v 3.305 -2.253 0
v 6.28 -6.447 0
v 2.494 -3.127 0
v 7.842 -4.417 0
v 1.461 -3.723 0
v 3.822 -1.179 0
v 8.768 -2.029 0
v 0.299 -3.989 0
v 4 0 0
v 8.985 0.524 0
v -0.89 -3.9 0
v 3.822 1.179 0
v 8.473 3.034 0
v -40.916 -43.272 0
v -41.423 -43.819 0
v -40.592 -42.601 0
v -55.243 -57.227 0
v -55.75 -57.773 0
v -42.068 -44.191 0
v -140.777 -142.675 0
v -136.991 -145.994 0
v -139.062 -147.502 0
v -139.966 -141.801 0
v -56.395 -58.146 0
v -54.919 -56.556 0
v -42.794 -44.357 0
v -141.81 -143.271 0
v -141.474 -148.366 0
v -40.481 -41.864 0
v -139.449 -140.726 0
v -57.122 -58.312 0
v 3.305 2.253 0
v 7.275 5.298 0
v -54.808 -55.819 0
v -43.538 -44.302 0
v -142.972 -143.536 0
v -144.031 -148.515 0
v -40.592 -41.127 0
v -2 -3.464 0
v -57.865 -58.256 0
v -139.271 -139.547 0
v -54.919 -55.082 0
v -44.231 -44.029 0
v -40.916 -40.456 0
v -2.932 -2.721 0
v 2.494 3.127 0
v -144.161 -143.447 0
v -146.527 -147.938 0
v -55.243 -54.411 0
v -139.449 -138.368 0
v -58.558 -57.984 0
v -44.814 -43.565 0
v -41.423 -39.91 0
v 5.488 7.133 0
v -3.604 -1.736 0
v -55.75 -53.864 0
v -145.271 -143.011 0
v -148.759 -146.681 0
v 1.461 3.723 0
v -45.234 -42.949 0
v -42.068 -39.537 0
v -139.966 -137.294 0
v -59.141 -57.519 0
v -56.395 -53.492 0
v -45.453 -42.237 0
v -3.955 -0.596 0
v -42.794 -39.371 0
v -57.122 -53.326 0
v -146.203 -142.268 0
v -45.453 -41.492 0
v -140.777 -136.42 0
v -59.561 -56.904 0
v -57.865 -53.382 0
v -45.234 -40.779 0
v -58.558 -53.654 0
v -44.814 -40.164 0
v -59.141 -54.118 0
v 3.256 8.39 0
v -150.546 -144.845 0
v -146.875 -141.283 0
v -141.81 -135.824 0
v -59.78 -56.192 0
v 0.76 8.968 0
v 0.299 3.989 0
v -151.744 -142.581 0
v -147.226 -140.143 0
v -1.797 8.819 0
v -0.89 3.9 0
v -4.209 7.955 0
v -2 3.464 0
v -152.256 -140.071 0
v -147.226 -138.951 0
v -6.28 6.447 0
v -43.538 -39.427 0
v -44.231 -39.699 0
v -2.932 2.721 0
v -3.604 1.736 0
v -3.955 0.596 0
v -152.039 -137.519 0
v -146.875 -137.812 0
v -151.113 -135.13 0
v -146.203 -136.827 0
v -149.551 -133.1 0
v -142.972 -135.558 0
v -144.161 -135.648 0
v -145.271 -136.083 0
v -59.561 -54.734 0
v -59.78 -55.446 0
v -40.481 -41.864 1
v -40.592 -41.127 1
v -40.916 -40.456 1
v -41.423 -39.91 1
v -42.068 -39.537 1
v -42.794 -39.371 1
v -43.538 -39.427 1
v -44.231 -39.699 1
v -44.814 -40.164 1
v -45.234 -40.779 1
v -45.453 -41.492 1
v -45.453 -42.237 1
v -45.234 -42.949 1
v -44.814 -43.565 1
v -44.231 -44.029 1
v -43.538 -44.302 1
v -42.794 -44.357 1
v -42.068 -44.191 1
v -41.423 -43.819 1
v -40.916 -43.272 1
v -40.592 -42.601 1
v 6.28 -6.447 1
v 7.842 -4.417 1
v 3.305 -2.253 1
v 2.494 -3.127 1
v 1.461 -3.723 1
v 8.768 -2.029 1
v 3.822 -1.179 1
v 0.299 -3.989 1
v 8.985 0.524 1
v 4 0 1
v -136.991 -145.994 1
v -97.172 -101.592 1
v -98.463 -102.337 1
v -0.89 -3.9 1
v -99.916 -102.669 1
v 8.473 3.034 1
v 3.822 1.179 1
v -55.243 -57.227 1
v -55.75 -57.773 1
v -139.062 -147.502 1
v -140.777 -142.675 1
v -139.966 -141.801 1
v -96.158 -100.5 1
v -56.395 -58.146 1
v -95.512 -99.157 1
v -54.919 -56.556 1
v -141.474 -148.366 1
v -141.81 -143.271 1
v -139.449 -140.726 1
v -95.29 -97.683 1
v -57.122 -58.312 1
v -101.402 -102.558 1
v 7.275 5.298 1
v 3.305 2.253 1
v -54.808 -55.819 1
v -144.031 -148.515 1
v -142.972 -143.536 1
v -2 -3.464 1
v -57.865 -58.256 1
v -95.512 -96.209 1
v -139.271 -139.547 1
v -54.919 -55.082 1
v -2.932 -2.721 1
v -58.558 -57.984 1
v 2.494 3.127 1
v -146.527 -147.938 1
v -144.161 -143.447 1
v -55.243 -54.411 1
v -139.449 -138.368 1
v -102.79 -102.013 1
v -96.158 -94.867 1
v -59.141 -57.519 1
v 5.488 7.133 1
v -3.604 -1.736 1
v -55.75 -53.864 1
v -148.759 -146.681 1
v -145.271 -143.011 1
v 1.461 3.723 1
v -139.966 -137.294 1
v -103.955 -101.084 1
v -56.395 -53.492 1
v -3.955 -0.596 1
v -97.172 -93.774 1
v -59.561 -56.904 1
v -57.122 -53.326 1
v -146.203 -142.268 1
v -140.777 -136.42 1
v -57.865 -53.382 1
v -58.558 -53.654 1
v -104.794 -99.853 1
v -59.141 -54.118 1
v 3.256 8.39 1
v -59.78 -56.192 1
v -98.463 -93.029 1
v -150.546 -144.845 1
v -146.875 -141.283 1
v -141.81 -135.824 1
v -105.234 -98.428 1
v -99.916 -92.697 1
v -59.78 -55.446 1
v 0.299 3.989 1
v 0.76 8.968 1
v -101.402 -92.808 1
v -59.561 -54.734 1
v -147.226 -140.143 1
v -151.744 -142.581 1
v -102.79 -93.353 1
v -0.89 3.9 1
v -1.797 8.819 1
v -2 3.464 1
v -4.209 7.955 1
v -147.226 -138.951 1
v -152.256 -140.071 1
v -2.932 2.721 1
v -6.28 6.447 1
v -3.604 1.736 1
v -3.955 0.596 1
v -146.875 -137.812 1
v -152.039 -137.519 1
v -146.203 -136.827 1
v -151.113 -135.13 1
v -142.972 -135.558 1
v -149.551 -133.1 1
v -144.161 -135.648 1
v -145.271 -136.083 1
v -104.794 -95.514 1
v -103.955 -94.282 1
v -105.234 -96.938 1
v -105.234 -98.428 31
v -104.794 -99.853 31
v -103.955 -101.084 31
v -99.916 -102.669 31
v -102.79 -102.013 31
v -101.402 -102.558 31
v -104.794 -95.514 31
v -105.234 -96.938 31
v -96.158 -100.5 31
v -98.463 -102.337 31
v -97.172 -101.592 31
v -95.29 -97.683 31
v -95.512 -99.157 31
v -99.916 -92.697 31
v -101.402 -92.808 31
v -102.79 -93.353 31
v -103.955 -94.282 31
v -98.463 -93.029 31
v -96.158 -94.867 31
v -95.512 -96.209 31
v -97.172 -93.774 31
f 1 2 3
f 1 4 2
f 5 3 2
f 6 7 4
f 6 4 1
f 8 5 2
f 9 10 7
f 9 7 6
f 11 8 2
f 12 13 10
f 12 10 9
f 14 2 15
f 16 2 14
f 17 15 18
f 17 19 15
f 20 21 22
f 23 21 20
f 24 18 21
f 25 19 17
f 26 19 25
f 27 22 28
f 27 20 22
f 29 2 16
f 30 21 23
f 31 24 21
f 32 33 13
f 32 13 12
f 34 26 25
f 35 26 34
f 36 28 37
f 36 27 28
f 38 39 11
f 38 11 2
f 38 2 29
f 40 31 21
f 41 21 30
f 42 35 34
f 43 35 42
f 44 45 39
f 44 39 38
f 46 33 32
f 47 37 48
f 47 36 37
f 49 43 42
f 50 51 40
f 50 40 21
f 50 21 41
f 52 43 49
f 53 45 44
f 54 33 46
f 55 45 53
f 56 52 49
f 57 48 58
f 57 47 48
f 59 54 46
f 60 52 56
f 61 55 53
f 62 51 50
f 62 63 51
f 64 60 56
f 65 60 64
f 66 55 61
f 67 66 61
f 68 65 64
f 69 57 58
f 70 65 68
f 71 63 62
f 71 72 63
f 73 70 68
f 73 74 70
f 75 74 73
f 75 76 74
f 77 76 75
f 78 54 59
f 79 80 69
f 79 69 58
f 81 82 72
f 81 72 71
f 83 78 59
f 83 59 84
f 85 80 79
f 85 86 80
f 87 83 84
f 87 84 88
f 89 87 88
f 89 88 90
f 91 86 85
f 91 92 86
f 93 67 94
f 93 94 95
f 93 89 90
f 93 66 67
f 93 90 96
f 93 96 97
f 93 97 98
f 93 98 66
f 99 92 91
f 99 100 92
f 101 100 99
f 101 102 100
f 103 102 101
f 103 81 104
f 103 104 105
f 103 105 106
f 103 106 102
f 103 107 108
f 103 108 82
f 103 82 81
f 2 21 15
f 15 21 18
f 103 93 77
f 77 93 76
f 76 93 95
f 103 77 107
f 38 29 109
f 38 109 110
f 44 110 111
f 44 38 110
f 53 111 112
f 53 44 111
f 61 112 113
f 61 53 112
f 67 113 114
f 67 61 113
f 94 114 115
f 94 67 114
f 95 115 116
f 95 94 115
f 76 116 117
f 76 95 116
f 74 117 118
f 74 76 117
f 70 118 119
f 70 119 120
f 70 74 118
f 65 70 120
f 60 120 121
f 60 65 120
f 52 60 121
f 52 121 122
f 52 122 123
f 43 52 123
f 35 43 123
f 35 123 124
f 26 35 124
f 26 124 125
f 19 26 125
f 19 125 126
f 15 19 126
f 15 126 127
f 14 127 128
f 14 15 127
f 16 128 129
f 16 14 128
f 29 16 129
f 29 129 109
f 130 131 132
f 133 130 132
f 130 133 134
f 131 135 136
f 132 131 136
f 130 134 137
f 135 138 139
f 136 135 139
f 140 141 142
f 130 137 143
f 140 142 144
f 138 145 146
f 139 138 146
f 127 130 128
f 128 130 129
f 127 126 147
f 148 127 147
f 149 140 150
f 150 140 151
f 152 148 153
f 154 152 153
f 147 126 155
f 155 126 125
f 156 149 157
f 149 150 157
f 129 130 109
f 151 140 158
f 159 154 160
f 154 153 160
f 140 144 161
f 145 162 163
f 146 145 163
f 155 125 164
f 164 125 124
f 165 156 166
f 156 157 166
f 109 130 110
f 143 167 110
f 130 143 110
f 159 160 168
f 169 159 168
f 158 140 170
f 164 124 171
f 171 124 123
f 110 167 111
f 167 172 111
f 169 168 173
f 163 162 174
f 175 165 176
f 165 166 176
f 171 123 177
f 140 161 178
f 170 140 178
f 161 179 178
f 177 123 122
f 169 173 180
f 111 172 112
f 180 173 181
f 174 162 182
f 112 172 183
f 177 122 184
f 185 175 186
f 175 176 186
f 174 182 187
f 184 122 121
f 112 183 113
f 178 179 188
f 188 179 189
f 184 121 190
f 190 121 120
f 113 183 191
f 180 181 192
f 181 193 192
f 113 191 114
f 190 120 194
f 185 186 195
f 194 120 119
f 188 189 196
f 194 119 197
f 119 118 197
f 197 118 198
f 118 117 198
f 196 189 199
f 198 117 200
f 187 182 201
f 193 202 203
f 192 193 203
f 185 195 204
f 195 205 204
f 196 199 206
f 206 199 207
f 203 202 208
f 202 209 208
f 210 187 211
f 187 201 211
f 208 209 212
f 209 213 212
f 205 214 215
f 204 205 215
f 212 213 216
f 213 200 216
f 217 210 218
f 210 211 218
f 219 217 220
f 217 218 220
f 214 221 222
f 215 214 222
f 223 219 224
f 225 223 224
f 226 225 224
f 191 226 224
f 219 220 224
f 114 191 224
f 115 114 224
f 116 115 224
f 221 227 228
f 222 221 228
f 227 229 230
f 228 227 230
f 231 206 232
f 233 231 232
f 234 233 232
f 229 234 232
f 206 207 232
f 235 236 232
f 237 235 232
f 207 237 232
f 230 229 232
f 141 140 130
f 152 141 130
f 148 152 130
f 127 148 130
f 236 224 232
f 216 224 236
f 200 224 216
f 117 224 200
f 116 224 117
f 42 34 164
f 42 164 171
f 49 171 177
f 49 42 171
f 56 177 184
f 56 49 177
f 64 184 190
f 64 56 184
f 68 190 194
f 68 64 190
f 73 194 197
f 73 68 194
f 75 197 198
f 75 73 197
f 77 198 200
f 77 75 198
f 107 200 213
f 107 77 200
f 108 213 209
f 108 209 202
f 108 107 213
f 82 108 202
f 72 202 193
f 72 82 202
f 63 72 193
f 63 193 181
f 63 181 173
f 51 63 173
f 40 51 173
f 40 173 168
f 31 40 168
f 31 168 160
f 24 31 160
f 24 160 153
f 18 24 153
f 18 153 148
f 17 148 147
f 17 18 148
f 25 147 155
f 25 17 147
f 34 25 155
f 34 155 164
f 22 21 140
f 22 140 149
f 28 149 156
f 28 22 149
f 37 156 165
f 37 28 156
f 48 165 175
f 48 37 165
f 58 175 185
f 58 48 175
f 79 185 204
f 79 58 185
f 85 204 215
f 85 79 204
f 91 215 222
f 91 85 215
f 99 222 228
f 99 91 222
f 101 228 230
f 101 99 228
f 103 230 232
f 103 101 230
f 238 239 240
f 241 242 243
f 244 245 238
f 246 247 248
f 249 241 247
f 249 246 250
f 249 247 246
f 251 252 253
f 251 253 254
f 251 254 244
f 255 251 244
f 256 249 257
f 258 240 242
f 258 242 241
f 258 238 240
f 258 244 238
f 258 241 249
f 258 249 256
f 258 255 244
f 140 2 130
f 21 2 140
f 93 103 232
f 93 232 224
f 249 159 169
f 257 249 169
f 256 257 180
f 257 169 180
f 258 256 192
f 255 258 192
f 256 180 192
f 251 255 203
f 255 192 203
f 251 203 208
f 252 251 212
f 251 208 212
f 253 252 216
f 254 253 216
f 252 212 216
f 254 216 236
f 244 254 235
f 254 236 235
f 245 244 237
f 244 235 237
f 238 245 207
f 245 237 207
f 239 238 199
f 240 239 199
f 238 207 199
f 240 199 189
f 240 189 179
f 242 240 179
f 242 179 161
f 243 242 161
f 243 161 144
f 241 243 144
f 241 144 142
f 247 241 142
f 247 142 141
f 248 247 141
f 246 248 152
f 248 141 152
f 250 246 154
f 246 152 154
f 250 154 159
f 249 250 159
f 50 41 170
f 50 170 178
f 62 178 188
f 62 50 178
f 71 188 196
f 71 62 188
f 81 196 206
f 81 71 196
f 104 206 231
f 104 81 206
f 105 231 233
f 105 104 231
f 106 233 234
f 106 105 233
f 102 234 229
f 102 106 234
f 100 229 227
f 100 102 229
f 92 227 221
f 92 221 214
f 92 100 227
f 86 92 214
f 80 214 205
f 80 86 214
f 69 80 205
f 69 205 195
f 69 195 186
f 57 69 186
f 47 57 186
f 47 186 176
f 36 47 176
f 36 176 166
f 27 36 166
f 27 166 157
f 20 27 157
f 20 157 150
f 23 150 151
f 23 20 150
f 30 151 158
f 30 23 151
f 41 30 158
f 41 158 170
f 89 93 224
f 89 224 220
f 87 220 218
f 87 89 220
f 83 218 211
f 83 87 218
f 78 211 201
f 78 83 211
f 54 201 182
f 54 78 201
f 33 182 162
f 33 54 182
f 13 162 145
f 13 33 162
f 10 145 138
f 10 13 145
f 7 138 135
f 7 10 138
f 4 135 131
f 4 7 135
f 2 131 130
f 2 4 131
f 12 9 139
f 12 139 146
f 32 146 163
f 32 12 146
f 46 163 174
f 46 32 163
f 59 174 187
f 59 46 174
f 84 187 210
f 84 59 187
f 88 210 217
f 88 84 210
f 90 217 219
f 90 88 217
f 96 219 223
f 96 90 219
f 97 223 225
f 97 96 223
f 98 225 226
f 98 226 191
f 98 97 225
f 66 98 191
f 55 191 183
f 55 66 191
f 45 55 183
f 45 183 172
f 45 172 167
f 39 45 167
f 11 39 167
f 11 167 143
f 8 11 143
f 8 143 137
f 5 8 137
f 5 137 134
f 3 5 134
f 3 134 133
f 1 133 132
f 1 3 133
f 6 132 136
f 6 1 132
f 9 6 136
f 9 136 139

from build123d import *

# Parameters (mm, degrees)
SKETCH1_R           = 4
SKETCH1_R_2         = 2.5
BOSS_EXTRUDE1_DEPTH = 1
SKETCH2_R           = 5
BOSS_EXTRUDE2_DEPTH = 30


with BuildPart() as part:
    # Sketch1 → Boss-Extrude1 (new body)
    with BuildSketch(Plane.XY):
        with BuildLine():
            Line((6.279627947, -6.447191082), (-136.991284981, -145.994478797))
            ThreePointArc((-136.991284981, -145.994478797), (-149.71810401, -145.826915663), (-149.550540875, -133.100096634))
            Line((-149.550540875, -133.100096634), (-6.279627947, 6.447191082))
            ThreePointArc((-6.279627947, 6.447191082), (6.447191082, 6.279627947), (6.279627947, -6.447191082))
        make_face()
        Circle(SKETCH1_R, mode=Mode.SUBTRACT)
        with Locations((-143.270912928, -139.547287716)):
            Circle(SKETCH1_R, mode=Mode.SUBTRACT)
        with Locations((-42.981273878, -41.864186315)):
            Circle(SKETCH1_R_2, mode=Mode.SUBTRACT)
        with Locations((-57.308365171, -55.818915086)):
            Circle(SKETCH1_R_2, mode=Mode.SUBTRACT)
    extrude(amount=BOSS_EXTRUDE1_DEPTH)

    # Sketch2 → Boss-Extrude2 (add)
    with BuildSketch(Plane.XY.offset(1)):
        with Locations((-100.28963905, -97.683101401)):
            Circle(SKETCH2_R)
    extrude(amount=BOSS_EXTRUDE2_DEPTH)


solid = part.part
